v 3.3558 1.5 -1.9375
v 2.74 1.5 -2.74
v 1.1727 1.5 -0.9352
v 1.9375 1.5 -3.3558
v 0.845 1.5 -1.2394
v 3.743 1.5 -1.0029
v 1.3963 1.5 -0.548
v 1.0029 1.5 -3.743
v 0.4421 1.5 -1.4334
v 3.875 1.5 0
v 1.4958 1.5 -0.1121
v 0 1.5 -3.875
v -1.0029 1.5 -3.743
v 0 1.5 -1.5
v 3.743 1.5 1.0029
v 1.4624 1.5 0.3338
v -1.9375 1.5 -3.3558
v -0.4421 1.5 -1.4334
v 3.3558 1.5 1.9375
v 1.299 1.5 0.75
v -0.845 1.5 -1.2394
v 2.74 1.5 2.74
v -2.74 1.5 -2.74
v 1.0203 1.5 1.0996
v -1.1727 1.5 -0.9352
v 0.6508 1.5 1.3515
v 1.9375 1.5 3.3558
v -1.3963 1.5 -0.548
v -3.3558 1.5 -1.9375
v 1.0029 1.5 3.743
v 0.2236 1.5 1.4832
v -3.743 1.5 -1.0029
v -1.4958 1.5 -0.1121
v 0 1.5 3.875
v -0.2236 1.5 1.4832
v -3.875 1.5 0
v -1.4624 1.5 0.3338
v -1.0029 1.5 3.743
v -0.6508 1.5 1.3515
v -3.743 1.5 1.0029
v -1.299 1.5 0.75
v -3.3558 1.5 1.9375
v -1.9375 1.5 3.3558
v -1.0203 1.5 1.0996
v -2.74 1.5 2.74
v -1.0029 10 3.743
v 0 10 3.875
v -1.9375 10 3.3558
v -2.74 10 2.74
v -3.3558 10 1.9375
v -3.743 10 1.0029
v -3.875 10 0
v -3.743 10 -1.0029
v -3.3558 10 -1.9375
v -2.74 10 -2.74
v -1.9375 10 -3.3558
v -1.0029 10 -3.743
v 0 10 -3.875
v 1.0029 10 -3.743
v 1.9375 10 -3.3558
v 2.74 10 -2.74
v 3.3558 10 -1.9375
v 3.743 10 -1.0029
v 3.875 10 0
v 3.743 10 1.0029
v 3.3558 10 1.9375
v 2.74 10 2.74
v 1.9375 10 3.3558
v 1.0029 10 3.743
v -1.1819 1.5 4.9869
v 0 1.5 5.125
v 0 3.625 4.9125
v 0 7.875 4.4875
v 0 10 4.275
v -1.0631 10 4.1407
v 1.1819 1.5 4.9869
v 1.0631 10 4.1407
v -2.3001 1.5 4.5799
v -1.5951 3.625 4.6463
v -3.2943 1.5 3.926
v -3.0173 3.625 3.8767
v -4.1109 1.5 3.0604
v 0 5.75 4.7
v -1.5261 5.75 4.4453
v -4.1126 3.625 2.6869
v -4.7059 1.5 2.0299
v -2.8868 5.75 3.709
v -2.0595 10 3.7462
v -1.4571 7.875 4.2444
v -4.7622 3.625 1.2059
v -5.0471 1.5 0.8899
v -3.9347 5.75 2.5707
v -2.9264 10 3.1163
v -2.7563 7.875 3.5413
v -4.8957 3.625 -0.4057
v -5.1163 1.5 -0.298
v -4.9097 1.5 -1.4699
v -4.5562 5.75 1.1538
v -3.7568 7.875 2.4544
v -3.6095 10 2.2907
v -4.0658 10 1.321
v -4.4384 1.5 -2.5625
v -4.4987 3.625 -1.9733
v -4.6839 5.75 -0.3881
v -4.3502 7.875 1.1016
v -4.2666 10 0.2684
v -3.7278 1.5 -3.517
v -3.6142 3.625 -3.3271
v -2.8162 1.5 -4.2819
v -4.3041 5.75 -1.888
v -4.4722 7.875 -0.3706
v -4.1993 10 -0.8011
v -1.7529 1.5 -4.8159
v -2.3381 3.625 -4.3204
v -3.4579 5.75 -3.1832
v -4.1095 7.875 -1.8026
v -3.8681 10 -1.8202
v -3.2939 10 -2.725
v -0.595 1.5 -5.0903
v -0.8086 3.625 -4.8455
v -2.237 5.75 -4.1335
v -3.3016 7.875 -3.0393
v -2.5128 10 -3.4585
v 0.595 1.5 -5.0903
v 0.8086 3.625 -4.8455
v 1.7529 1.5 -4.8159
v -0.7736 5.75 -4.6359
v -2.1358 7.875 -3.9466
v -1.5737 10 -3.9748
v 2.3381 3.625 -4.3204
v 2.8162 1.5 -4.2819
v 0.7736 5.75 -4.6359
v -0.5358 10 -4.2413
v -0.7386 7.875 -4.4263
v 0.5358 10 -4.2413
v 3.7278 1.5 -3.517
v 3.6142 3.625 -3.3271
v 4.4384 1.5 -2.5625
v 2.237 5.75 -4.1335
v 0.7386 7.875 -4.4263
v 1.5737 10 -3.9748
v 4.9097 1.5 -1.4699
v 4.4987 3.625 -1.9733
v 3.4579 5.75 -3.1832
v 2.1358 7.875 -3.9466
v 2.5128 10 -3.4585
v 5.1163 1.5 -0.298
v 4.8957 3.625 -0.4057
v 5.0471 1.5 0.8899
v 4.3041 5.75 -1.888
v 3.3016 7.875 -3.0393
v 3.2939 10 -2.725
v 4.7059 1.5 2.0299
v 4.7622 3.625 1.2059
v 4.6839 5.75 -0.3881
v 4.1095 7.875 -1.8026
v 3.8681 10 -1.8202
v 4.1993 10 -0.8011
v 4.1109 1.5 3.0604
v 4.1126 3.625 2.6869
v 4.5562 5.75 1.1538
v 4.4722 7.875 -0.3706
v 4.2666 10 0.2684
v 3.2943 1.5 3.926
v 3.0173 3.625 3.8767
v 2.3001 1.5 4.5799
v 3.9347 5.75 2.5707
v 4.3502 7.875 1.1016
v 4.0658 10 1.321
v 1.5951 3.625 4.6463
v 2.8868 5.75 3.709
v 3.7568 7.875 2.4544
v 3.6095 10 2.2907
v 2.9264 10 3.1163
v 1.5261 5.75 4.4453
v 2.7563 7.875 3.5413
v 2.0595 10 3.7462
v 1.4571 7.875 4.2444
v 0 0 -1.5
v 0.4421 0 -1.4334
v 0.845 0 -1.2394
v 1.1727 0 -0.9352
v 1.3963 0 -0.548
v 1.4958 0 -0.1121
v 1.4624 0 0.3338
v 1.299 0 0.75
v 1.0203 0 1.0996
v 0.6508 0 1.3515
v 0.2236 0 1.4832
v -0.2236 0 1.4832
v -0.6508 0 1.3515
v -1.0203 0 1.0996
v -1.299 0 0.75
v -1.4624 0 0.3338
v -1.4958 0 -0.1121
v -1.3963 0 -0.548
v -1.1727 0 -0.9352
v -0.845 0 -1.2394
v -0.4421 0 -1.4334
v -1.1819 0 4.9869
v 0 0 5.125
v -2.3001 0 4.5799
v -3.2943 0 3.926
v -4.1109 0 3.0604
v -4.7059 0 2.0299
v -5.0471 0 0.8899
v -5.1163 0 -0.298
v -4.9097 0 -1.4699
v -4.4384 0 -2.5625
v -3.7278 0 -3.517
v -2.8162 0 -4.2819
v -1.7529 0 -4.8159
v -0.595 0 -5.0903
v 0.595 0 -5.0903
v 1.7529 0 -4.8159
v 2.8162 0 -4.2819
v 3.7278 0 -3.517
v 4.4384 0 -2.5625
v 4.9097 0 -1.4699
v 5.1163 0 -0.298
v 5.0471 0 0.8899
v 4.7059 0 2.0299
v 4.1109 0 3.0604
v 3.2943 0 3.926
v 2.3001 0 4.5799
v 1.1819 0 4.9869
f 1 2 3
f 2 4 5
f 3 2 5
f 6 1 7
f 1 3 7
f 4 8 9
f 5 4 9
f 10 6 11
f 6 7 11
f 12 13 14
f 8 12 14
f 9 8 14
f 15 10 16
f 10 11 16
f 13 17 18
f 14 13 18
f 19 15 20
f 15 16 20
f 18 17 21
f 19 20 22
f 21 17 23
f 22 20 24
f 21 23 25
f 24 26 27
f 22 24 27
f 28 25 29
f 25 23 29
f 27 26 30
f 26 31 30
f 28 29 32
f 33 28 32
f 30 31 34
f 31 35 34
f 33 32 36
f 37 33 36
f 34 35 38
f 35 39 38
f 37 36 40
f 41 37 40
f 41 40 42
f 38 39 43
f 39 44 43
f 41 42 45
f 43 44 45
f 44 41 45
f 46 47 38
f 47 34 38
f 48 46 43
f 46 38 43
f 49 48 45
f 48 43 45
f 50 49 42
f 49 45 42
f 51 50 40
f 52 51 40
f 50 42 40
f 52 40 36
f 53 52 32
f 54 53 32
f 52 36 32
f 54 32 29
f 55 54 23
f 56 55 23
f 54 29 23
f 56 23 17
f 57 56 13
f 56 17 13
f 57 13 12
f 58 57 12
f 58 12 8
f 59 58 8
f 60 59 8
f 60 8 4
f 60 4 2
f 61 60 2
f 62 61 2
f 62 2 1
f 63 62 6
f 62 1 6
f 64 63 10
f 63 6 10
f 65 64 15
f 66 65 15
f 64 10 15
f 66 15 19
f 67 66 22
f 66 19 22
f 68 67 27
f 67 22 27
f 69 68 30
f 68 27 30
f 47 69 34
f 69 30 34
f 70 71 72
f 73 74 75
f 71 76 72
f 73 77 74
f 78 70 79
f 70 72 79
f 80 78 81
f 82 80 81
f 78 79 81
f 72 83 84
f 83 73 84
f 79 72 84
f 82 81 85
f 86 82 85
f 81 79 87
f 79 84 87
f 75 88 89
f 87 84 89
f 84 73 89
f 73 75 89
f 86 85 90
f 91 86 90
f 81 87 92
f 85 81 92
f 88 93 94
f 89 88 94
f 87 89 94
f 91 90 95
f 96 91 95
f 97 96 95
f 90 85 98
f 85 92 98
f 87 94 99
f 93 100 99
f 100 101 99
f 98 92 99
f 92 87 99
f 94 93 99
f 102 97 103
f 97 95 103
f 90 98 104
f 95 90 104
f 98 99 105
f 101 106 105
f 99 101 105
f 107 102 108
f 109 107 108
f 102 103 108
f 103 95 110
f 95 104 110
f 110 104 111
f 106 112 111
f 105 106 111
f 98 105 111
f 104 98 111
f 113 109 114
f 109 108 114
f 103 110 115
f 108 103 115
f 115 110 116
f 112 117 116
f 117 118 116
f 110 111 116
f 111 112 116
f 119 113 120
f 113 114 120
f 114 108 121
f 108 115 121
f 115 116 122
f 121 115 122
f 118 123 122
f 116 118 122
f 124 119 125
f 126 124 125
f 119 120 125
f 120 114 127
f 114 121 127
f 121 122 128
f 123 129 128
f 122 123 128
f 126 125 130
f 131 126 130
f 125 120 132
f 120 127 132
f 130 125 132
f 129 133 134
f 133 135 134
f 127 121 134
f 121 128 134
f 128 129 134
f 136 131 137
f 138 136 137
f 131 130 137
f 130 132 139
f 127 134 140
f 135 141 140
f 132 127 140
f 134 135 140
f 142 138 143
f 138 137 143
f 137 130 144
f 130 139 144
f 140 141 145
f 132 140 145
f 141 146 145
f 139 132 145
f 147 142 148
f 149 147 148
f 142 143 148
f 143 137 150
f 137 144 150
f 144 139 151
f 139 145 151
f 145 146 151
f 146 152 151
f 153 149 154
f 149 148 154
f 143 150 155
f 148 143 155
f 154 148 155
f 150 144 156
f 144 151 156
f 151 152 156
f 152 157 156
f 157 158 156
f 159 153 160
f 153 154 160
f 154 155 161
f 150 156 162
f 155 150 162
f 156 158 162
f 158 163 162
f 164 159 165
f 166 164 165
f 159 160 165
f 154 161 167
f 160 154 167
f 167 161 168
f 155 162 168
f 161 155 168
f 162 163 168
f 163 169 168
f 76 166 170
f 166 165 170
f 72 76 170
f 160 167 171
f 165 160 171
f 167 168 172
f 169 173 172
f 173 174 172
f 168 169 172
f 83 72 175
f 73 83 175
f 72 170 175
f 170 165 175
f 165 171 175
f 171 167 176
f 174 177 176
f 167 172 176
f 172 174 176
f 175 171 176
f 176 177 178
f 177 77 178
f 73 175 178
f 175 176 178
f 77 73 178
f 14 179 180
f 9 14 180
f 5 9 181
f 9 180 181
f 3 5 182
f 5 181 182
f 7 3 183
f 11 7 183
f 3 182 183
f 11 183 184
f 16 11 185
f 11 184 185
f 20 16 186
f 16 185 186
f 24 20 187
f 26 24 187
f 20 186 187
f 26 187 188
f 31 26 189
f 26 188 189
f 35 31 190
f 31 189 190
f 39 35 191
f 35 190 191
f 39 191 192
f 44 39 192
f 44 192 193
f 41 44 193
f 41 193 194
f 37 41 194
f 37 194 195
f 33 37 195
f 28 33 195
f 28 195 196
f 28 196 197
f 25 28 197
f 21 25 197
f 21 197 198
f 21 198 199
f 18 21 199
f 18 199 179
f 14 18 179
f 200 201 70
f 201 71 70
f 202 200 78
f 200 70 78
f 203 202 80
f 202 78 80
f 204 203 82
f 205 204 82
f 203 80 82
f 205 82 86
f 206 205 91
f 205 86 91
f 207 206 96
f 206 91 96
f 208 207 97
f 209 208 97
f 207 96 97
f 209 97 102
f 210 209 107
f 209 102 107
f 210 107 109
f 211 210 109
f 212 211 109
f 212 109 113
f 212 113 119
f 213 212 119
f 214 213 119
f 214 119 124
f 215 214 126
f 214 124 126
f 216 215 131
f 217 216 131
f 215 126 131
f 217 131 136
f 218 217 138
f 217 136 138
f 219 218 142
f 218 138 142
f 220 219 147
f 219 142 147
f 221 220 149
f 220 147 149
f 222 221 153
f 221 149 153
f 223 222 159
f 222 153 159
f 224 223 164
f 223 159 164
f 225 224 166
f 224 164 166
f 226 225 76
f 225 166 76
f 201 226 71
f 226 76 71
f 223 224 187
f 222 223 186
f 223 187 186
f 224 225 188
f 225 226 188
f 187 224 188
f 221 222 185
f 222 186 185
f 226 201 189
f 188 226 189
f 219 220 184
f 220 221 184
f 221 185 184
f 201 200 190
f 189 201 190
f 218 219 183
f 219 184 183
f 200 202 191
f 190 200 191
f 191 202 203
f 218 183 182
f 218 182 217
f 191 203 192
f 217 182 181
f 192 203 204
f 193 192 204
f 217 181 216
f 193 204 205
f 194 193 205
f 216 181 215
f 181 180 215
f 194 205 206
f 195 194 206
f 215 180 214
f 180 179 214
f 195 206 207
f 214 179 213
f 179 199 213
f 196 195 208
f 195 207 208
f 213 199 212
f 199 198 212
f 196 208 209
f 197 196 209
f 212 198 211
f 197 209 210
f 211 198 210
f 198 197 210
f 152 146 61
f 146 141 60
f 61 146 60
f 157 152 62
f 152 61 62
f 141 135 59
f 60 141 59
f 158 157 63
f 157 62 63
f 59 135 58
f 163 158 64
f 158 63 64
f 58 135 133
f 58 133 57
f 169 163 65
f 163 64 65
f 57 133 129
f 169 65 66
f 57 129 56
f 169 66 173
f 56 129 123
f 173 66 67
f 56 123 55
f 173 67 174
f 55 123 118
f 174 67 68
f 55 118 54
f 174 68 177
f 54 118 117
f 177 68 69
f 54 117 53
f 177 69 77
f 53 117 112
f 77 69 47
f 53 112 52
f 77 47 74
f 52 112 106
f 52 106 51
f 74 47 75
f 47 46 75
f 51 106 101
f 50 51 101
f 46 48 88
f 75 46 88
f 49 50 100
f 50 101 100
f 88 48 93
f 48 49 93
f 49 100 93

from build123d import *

# Parameters (mm, degrees)
SKETCH2_R          = 1.5
CUT_EXTRUDE1_DEPTH = 13.350354246


with BuildPart() as part:
    # Sketch1 → Revolve1 (revolve)
    with BuildSketch(Plane.YZ):
        Polygon((0, 0), (0, 5.125), (1.5, 5.125), (10, 4.275), (10, 3.875), (1.5, 3.875), (1.5, 0), align=None)
    revolve(axis=Axis((0, 1.5, 0), (0, -1, 0)))

    # Sketch2 → Cut-Extrude1 (cut, through all)
    with BuildSketch(Plane.XZ):
        with Locations(Location((0, 0, 0), (0, 0, 270))):
            Circle(SKETCH2_R)
    extrude(amount=-CUT_EXTRUDE1_DEPTH, mode=Mode.SUBTRACT)


solid = part.part
